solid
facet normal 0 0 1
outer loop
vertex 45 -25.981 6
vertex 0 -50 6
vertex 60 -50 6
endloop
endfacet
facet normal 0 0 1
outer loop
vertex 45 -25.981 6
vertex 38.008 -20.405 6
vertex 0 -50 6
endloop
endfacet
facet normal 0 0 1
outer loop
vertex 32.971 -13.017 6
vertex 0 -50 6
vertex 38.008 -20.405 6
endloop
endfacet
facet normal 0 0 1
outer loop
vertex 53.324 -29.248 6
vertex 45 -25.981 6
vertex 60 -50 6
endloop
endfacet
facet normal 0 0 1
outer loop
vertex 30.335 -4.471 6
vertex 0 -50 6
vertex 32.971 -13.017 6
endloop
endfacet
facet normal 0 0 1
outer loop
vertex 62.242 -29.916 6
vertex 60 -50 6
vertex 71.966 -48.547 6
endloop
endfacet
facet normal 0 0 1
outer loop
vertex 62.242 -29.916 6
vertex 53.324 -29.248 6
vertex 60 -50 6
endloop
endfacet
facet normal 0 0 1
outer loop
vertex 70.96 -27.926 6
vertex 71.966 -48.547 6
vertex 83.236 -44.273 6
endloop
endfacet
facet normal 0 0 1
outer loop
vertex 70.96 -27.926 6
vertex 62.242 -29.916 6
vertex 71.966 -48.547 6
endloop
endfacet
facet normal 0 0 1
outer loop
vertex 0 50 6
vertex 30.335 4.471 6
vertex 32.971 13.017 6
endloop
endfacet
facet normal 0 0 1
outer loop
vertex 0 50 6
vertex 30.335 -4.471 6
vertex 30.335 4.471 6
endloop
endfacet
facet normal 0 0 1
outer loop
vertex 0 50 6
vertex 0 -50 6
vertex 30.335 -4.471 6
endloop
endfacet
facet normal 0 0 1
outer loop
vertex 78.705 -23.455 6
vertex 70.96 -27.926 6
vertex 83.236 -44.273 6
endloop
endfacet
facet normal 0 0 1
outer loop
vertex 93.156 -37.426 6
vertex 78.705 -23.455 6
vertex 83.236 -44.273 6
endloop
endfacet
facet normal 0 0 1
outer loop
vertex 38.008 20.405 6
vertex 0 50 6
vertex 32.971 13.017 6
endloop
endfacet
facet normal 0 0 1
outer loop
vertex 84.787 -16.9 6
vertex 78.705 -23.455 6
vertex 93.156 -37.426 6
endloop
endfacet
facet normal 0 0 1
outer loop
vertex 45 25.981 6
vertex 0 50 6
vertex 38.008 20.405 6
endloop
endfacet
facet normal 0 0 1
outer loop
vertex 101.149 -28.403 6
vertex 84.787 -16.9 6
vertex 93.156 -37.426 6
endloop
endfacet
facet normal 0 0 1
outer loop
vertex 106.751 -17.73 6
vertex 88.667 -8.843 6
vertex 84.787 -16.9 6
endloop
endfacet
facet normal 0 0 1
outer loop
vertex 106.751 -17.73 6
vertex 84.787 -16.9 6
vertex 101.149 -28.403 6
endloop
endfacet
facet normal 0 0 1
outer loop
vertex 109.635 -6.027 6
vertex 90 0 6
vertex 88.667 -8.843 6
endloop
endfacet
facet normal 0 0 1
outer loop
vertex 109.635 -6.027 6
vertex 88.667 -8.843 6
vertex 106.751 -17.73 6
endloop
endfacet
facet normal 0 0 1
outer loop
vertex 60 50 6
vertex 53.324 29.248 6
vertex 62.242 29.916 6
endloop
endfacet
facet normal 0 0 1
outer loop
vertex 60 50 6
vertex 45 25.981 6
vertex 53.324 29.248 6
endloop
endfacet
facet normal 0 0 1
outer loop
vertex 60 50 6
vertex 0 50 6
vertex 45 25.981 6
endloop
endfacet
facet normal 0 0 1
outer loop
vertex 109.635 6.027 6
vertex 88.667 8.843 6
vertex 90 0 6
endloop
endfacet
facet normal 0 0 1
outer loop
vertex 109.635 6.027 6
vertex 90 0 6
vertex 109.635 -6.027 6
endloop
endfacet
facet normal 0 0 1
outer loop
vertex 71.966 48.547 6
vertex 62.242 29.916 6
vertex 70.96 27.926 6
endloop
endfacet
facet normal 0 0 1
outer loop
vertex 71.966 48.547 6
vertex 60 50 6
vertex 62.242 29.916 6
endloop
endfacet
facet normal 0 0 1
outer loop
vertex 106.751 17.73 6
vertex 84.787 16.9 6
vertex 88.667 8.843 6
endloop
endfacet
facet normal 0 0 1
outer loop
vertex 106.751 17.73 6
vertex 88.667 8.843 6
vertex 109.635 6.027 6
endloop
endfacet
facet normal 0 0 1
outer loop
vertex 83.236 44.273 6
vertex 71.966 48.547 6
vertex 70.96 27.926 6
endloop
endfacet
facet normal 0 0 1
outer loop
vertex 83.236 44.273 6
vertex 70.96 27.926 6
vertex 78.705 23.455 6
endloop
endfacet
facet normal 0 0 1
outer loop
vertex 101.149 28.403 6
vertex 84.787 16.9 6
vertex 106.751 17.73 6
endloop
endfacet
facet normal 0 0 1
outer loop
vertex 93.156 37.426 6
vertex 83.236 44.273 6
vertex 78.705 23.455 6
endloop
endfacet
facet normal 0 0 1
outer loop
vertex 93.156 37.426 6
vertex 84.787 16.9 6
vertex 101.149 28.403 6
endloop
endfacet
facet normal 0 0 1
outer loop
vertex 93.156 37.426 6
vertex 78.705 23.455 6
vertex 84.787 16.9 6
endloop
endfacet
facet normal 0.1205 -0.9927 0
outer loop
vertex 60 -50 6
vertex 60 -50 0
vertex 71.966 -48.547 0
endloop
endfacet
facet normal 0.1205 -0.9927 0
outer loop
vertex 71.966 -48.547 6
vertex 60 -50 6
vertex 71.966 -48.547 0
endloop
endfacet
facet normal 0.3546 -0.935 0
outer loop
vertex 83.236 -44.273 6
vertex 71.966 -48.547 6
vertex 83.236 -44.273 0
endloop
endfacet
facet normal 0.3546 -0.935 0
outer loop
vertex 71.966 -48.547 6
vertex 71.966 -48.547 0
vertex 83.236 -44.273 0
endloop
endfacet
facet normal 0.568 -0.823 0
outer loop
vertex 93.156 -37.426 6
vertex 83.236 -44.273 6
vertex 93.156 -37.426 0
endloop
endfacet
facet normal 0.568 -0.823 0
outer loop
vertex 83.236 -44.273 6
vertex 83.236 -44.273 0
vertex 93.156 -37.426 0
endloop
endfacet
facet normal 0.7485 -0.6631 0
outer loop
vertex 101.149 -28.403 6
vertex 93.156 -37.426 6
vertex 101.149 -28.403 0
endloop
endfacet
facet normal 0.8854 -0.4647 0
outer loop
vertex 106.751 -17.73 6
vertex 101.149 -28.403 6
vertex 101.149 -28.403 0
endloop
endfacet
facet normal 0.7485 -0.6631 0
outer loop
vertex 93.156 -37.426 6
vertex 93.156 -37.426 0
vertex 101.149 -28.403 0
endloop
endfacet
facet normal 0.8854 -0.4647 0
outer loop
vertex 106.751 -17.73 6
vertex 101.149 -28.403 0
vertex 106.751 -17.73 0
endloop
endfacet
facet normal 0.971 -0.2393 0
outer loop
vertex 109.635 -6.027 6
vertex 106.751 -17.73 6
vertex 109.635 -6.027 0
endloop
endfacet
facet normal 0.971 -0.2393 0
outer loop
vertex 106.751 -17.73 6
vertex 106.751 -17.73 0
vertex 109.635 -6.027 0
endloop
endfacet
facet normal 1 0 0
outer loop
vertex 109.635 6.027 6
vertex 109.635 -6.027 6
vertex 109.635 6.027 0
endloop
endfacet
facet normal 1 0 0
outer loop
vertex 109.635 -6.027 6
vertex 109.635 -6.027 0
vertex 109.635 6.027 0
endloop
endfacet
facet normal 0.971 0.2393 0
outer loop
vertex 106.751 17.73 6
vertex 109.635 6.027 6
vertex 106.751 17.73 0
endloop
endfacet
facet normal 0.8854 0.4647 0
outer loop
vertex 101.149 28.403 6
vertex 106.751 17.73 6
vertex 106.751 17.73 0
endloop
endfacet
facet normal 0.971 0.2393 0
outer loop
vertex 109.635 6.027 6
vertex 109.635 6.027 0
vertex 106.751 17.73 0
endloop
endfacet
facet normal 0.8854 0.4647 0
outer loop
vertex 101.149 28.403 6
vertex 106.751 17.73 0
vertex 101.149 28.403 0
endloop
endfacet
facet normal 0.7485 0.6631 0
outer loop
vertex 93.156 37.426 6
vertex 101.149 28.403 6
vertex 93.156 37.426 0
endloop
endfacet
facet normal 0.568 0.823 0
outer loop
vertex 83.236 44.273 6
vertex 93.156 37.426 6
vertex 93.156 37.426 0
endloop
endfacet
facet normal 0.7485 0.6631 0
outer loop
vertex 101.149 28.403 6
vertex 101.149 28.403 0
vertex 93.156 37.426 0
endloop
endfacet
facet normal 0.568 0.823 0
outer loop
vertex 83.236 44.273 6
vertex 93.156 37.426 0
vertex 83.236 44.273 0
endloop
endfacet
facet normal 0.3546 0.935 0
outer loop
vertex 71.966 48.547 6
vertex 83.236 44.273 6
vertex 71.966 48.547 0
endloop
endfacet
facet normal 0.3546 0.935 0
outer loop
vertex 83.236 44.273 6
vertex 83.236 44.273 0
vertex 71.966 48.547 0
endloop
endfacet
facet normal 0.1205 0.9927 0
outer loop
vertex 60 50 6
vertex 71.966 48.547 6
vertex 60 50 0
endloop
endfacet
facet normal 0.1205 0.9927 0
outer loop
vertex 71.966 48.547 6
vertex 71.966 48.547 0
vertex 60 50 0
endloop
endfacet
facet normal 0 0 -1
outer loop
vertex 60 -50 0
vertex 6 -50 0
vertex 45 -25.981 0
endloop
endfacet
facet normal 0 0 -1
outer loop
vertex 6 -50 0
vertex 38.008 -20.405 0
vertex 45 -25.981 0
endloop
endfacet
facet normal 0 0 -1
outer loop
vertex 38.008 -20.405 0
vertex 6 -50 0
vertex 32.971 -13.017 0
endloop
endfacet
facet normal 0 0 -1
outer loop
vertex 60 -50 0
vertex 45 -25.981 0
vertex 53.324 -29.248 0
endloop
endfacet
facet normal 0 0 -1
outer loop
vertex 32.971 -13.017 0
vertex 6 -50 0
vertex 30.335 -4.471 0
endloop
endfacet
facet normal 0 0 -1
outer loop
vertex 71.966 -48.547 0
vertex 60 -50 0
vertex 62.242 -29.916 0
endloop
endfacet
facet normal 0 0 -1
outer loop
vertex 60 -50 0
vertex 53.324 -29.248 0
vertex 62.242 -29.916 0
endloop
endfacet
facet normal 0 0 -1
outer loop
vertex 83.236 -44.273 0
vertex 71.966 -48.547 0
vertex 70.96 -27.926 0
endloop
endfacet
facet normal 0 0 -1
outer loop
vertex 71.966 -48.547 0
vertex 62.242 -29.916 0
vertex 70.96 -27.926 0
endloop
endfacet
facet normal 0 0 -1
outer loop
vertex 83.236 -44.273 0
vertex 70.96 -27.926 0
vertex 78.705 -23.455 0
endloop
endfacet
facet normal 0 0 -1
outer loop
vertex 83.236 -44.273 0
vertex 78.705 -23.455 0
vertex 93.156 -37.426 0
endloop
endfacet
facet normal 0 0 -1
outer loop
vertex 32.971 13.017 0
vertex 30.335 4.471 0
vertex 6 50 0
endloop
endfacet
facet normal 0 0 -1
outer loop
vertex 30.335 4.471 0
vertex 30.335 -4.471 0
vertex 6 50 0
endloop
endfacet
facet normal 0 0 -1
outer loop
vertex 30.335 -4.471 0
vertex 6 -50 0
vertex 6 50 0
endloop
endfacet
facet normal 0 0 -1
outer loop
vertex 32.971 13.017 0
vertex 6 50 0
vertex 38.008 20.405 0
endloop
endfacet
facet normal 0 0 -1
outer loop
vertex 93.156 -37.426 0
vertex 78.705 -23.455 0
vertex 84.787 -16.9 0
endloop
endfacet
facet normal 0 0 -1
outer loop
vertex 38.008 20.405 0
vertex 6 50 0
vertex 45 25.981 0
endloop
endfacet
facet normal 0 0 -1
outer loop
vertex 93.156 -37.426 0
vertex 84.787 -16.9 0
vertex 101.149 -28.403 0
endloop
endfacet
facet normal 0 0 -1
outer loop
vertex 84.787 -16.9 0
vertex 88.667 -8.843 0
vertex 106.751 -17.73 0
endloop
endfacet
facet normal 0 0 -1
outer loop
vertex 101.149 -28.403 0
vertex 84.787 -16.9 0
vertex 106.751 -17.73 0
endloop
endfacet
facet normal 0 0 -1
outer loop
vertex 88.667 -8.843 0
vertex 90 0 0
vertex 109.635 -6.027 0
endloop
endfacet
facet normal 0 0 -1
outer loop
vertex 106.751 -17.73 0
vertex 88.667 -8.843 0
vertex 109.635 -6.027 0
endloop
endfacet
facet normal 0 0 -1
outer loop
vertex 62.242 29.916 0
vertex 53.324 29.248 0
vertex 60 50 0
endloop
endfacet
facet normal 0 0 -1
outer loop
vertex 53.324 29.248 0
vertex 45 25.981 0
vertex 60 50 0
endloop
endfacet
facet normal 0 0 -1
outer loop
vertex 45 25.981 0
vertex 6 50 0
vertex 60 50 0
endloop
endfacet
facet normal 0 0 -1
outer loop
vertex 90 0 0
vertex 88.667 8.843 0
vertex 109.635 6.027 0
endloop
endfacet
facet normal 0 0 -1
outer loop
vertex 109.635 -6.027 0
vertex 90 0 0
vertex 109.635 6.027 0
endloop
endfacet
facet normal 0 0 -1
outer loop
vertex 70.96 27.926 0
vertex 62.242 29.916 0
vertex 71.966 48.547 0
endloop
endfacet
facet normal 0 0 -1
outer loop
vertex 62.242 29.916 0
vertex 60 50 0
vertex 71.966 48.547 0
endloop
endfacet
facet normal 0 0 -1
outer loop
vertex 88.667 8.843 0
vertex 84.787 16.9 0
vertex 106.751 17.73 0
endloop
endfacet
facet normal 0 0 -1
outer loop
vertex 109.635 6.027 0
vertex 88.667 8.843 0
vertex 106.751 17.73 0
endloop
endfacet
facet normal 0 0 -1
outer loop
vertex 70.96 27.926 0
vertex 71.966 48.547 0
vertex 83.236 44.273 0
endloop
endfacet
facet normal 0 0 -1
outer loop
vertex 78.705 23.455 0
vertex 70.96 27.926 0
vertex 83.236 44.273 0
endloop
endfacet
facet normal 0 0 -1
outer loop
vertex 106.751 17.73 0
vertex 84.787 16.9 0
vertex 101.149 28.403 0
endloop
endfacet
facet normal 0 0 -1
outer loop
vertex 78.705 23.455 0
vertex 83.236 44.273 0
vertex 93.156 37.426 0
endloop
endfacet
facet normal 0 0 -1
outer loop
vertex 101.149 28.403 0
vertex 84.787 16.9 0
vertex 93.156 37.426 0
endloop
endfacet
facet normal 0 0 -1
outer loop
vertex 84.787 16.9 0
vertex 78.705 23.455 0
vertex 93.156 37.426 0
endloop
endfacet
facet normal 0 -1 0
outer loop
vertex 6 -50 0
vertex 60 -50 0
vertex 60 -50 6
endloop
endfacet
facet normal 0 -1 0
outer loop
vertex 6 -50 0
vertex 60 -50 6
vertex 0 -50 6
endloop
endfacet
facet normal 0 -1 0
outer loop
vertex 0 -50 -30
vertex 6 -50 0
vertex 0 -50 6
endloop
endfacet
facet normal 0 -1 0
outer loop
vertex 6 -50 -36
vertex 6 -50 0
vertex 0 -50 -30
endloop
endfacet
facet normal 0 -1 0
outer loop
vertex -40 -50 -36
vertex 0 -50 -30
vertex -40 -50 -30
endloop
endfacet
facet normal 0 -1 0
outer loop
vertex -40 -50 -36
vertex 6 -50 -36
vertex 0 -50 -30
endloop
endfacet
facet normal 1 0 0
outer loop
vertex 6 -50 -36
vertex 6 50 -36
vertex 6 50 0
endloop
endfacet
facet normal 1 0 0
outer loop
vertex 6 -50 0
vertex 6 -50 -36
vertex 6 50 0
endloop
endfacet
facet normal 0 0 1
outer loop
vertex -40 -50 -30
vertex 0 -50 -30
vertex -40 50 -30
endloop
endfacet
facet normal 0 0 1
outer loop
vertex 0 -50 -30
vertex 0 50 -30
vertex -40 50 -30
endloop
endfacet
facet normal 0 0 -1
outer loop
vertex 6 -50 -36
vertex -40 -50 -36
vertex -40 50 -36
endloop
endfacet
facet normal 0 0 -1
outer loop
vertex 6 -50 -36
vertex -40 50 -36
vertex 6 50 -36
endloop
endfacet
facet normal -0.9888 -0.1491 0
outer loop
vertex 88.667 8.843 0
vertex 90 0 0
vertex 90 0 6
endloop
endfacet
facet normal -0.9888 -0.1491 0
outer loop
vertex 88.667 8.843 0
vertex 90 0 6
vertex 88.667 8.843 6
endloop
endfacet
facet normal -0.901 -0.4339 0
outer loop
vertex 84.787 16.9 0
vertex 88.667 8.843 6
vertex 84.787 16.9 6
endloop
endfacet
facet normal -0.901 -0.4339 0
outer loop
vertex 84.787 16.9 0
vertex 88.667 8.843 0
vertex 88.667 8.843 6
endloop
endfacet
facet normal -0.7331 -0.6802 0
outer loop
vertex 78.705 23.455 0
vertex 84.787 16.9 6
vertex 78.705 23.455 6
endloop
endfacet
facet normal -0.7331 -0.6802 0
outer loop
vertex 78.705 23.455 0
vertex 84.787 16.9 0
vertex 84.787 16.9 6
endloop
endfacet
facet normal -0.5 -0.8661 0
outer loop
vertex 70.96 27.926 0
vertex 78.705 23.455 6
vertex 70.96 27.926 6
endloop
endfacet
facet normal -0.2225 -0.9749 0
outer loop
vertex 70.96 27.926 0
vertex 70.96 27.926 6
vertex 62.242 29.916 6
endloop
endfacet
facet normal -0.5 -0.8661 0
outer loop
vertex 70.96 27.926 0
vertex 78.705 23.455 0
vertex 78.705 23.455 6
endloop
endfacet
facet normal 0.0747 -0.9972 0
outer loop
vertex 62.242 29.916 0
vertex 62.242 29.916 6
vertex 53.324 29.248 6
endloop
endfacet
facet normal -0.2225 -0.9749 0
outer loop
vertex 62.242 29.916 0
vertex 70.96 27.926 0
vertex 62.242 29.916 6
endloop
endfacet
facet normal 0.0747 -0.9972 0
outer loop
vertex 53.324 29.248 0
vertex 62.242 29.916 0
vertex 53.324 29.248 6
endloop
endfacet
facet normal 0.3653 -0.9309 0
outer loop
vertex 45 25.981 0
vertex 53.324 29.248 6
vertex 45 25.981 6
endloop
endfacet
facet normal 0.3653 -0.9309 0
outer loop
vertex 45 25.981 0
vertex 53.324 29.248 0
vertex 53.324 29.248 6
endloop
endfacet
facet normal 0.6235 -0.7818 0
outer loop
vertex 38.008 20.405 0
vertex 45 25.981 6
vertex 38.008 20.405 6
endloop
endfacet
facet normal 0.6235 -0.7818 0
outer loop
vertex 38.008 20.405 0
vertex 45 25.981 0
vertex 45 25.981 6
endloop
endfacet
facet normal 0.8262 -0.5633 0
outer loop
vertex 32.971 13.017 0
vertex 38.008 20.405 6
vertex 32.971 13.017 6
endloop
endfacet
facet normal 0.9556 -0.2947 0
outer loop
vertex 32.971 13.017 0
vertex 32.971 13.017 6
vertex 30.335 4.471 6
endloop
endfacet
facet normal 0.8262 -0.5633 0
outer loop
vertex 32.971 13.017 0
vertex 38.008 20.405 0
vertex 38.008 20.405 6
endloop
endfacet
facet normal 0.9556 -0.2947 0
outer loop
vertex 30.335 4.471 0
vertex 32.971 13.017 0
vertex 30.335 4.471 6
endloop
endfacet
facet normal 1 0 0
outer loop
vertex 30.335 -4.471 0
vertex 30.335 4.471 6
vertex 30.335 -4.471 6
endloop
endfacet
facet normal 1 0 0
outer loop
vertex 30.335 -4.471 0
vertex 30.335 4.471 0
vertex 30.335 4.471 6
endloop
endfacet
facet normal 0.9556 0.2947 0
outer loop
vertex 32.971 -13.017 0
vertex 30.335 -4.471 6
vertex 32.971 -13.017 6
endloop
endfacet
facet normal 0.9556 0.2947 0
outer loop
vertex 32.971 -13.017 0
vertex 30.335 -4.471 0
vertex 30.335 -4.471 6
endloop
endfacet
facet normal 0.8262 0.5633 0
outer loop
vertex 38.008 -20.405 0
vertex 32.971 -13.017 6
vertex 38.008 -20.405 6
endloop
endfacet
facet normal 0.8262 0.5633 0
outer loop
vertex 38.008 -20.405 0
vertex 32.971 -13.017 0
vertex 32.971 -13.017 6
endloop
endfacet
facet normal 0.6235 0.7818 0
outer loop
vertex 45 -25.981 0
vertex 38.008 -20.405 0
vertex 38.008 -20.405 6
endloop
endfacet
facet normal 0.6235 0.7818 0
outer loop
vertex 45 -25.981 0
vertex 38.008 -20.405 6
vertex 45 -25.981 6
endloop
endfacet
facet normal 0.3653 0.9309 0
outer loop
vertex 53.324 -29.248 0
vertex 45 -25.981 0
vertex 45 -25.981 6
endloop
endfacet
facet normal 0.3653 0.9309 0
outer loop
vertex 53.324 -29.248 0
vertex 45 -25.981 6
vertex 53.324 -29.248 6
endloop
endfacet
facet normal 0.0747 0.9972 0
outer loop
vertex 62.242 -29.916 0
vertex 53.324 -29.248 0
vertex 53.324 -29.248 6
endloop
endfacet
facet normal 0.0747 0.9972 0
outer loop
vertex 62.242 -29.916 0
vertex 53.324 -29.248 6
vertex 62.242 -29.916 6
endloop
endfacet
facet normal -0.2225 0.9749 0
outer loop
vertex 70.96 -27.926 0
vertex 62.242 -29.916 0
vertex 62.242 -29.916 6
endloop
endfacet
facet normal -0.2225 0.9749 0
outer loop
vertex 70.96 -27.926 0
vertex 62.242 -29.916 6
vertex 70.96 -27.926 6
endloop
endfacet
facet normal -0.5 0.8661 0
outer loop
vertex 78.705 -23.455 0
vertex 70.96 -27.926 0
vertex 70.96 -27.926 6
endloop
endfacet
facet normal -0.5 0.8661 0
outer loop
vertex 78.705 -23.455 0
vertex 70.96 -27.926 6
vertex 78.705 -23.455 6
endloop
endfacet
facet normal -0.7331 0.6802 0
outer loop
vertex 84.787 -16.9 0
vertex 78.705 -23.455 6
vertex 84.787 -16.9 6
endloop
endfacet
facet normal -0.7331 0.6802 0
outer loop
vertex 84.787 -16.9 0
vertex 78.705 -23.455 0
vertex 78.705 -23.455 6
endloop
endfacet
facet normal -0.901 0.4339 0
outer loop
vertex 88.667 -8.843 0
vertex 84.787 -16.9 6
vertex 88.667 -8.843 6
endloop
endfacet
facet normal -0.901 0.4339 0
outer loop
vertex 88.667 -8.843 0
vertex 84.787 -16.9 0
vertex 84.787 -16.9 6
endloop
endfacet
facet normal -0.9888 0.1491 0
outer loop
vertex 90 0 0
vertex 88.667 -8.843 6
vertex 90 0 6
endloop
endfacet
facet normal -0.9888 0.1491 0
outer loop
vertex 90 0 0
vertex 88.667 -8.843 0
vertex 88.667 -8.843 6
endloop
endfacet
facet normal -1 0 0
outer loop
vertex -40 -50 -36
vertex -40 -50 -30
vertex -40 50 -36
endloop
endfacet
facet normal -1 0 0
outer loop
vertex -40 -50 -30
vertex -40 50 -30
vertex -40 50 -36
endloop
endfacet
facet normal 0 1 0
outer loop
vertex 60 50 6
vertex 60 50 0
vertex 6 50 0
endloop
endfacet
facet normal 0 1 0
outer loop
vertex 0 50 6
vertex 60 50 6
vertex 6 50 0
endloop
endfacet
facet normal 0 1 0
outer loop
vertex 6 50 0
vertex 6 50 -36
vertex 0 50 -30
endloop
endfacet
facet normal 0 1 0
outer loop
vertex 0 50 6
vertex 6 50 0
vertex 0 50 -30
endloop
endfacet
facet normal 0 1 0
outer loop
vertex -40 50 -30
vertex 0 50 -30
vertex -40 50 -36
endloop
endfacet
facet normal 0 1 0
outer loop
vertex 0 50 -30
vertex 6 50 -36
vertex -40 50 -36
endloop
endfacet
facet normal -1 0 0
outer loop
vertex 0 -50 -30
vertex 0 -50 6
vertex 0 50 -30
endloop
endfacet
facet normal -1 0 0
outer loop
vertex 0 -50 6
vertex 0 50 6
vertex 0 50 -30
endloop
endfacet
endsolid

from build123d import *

# Parameters (mm, degrees)
SKETCH_1_R      = 30
EXTRUDE_1_DEPTH = 6
EXTRUDE_2_DEPTH = 50


with BuildPart() as part:
    # 草图1 → 凸台-拉伸1 (new body)
    with BuildSketch(Plane.XY):
        with BuildLine():
            Line((60, 50), (0, 50))
            Line((0, 50), (0, -50))
            Line((0, -50), (60, -50))
            ThreePointArc((60, -50), (110, 0), (60, 50))
        make_face()
        with Locations((60, 0)):
            Circle(SKETCH_1_R, mode=Mode.SUBTRACT)
    extrude(amount=EXTRUDE_1_DEPTH)

    # 草图2 → 凸台-拉伸2 (add, symmetric)
    with BuildSketch(Plane(origin=(0, 0, 0), x_dir=(1, 0, 0), z_dir=(0, 1, 0))):
        Polygon((0, 0), (0, 30), (-40, 30), (-40, 36), (6, 36), (6, 0), align=None)
    extrude(amount=EXTRUDE_2_DEPTH, both=True)


solid = part.part
